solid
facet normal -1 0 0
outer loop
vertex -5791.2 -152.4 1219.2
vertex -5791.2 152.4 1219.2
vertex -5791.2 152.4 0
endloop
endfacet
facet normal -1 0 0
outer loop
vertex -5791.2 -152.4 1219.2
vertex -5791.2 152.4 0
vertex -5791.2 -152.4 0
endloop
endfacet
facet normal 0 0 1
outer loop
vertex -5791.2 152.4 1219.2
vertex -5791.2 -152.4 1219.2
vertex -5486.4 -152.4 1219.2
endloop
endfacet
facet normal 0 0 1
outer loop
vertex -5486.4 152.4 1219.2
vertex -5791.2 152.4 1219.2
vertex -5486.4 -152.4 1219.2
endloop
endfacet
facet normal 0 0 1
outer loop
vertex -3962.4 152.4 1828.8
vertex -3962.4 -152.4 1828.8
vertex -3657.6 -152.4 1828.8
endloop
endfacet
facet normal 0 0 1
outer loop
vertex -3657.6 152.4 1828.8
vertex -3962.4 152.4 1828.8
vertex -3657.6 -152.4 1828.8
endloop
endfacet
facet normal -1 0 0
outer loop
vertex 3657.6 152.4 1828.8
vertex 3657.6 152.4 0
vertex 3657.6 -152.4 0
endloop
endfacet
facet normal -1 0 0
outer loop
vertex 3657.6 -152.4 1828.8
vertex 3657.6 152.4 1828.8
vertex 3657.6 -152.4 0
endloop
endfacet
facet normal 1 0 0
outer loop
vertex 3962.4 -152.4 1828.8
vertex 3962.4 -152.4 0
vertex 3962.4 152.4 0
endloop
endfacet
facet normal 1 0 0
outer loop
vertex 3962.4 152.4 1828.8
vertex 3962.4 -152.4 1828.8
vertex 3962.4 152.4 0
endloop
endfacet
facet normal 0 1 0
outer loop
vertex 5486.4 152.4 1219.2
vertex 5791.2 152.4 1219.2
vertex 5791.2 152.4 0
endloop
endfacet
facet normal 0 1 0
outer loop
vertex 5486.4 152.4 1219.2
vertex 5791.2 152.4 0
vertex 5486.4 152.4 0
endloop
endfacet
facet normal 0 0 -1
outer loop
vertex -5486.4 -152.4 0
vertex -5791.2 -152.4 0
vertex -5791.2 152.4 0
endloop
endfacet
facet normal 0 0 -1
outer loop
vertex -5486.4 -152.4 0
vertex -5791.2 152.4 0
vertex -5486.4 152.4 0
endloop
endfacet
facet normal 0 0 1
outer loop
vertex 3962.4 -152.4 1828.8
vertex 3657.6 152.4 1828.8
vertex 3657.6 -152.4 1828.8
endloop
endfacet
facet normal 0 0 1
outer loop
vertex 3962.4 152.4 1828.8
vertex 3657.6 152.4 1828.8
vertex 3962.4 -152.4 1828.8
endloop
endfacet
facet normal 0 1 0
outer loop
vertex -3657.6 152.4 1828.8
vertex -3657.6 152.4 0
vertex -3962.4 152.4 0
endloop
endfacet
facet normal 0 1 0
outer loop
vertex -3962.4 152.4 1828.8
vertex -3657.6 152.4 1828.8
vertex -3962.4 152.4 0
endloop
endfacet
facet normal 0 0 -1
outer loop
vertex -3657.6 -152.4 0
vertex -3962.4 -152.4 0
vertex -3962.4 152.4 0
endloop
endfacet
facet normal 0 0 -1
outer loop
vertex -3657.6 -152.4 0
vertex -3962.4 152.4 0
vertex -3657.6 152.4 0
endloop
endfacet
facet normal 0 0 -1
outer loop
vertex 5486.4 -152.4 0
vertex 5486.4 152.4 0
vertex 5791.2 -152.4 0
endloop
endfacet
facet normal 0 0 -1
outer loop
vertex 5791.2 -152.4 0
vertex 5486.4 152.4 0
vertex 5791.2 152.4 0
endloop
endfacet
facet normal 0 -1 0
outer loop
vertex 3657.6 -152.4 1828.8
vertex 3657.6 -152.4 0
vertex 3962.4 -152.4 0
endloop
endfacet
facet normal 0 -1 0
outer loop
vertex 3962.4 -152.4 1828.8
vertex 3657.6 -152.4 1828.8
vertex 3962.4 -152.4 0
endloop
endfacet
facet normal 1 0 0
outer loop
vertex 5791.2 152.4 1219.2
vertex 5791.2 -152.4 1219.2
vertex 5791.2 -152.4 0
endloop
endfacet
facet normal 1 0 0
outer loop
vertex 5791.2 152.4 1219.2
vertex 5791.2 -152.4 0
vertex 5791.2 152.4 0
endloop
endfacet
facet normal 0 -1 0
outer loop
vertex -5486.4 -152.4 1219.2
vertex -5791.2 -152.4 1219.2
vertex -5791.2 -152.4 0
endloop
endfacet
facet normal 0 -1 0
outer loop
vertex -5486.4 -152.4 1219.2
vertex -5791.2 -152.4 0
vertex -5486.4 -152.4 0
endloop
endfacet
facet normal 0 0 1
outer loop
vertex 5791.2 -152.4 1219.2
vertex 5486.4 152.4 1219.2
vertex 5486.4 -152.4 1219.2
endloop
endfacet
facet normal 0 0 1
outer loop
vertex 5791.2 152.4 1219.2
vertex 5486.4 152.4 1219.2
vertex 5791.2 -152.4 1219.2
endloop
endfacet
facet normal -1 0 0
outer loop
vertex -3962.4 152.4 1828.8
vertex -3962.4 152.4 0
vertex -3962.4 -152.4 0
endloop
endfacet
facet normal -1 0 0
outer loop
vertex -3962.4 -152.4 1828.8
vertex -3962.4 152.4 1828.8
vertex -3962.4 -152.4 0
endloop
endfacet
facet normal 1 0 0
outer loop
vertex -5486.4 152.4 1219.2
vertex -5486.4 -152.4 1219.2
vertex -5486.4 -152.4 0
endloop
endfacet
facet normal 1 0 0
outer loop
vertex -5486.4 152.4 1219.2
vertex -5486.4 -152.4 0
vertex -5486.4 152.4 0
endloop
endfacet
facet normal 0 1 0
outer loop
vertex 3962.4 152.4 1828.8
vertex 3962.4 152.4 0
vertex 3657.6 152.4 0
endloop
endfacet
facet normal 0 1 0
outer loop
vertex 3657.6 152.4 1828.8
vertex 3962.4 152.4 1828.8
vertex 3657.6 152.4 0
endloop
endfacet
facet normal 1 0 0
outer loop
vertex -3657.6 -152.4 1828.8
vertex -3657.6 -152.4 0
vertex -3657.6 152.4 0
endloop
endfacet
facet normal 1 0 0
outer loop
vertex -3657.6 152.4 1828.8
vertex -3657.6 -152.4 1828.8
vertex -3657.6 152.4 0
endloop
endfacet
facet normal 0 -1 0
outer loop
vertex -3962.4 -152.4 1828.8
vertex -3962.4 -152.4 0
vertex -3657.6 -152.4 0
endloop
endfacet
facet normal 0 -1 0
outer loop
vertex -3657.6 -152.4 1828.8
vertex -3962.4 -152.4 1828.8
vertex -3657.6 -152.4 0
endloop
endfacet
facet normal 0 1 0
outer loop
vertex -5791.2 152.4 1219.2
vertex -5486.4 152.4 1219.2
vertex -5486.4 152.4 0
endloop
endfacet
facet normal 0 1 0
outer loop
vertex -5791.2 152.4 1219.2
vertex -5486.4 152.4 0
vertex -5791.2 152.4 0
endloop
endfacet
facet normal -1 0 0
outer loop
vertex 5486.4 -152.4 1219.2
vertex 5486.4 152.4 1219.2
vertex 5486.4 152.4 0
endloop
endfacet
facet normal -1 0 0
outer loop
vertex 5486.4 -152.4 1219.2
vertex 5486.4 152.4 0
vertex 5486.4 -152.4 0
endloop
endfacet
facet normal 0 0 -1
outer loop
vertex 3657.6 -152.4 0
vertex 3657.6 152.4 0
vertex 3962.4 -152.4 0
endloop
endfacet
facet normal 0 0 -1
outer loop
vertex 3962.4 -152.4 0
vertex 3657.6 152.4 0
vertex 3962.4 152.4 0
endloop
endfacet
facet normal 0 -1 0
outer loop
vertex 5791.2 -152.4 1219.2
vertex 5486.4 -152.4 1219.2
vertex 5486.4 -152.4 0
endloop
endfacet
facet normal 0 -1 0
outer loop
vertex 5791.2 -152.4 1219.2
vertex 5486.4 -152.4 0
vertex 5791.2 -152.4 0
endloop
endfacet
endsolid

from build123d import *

# Parameters (mm, degrees)
F1_DEPTH = 1828.8
F3_DEPTH = 1219.2


with BuildPart() as f1:
    # F0 (on Top) → F1 (new body)
    with BuildSketch(Plane.XY):
        Polygon((-3657.6, -152.4), (-3657.6, 0), (-3657.6, 152.4), (-3962.4, 152.4), (-3962.4, -152.4), align=None)
        Polygon((3657.6, 152.4), (3657.6, 0), (3657.6, -152.4), (3962.4, -152.4), (3962.4, 152.4), align=None)
    extrude(amount=F1_DEPTH)


with BuildPart() as f3:
    # F2 (on Top) → F3 (new body)
    with BuildSketch(Plane.XY):
        Polygon((-5486.4, -152.4), (-5486.4, 0), (-5486.4, 152.4), (-5791.2, 152.4), (-5791.2, -152.4), align=None)
        Polygon((5486.4, 152.4), (5486.4, 0), (5486.4, -152.4), (5791.2, -152.4), (5791.2, 152.4), align=None)
    extrude(amount=F3_DEPTH)


solid = Compound([f1.part, f3.part])
